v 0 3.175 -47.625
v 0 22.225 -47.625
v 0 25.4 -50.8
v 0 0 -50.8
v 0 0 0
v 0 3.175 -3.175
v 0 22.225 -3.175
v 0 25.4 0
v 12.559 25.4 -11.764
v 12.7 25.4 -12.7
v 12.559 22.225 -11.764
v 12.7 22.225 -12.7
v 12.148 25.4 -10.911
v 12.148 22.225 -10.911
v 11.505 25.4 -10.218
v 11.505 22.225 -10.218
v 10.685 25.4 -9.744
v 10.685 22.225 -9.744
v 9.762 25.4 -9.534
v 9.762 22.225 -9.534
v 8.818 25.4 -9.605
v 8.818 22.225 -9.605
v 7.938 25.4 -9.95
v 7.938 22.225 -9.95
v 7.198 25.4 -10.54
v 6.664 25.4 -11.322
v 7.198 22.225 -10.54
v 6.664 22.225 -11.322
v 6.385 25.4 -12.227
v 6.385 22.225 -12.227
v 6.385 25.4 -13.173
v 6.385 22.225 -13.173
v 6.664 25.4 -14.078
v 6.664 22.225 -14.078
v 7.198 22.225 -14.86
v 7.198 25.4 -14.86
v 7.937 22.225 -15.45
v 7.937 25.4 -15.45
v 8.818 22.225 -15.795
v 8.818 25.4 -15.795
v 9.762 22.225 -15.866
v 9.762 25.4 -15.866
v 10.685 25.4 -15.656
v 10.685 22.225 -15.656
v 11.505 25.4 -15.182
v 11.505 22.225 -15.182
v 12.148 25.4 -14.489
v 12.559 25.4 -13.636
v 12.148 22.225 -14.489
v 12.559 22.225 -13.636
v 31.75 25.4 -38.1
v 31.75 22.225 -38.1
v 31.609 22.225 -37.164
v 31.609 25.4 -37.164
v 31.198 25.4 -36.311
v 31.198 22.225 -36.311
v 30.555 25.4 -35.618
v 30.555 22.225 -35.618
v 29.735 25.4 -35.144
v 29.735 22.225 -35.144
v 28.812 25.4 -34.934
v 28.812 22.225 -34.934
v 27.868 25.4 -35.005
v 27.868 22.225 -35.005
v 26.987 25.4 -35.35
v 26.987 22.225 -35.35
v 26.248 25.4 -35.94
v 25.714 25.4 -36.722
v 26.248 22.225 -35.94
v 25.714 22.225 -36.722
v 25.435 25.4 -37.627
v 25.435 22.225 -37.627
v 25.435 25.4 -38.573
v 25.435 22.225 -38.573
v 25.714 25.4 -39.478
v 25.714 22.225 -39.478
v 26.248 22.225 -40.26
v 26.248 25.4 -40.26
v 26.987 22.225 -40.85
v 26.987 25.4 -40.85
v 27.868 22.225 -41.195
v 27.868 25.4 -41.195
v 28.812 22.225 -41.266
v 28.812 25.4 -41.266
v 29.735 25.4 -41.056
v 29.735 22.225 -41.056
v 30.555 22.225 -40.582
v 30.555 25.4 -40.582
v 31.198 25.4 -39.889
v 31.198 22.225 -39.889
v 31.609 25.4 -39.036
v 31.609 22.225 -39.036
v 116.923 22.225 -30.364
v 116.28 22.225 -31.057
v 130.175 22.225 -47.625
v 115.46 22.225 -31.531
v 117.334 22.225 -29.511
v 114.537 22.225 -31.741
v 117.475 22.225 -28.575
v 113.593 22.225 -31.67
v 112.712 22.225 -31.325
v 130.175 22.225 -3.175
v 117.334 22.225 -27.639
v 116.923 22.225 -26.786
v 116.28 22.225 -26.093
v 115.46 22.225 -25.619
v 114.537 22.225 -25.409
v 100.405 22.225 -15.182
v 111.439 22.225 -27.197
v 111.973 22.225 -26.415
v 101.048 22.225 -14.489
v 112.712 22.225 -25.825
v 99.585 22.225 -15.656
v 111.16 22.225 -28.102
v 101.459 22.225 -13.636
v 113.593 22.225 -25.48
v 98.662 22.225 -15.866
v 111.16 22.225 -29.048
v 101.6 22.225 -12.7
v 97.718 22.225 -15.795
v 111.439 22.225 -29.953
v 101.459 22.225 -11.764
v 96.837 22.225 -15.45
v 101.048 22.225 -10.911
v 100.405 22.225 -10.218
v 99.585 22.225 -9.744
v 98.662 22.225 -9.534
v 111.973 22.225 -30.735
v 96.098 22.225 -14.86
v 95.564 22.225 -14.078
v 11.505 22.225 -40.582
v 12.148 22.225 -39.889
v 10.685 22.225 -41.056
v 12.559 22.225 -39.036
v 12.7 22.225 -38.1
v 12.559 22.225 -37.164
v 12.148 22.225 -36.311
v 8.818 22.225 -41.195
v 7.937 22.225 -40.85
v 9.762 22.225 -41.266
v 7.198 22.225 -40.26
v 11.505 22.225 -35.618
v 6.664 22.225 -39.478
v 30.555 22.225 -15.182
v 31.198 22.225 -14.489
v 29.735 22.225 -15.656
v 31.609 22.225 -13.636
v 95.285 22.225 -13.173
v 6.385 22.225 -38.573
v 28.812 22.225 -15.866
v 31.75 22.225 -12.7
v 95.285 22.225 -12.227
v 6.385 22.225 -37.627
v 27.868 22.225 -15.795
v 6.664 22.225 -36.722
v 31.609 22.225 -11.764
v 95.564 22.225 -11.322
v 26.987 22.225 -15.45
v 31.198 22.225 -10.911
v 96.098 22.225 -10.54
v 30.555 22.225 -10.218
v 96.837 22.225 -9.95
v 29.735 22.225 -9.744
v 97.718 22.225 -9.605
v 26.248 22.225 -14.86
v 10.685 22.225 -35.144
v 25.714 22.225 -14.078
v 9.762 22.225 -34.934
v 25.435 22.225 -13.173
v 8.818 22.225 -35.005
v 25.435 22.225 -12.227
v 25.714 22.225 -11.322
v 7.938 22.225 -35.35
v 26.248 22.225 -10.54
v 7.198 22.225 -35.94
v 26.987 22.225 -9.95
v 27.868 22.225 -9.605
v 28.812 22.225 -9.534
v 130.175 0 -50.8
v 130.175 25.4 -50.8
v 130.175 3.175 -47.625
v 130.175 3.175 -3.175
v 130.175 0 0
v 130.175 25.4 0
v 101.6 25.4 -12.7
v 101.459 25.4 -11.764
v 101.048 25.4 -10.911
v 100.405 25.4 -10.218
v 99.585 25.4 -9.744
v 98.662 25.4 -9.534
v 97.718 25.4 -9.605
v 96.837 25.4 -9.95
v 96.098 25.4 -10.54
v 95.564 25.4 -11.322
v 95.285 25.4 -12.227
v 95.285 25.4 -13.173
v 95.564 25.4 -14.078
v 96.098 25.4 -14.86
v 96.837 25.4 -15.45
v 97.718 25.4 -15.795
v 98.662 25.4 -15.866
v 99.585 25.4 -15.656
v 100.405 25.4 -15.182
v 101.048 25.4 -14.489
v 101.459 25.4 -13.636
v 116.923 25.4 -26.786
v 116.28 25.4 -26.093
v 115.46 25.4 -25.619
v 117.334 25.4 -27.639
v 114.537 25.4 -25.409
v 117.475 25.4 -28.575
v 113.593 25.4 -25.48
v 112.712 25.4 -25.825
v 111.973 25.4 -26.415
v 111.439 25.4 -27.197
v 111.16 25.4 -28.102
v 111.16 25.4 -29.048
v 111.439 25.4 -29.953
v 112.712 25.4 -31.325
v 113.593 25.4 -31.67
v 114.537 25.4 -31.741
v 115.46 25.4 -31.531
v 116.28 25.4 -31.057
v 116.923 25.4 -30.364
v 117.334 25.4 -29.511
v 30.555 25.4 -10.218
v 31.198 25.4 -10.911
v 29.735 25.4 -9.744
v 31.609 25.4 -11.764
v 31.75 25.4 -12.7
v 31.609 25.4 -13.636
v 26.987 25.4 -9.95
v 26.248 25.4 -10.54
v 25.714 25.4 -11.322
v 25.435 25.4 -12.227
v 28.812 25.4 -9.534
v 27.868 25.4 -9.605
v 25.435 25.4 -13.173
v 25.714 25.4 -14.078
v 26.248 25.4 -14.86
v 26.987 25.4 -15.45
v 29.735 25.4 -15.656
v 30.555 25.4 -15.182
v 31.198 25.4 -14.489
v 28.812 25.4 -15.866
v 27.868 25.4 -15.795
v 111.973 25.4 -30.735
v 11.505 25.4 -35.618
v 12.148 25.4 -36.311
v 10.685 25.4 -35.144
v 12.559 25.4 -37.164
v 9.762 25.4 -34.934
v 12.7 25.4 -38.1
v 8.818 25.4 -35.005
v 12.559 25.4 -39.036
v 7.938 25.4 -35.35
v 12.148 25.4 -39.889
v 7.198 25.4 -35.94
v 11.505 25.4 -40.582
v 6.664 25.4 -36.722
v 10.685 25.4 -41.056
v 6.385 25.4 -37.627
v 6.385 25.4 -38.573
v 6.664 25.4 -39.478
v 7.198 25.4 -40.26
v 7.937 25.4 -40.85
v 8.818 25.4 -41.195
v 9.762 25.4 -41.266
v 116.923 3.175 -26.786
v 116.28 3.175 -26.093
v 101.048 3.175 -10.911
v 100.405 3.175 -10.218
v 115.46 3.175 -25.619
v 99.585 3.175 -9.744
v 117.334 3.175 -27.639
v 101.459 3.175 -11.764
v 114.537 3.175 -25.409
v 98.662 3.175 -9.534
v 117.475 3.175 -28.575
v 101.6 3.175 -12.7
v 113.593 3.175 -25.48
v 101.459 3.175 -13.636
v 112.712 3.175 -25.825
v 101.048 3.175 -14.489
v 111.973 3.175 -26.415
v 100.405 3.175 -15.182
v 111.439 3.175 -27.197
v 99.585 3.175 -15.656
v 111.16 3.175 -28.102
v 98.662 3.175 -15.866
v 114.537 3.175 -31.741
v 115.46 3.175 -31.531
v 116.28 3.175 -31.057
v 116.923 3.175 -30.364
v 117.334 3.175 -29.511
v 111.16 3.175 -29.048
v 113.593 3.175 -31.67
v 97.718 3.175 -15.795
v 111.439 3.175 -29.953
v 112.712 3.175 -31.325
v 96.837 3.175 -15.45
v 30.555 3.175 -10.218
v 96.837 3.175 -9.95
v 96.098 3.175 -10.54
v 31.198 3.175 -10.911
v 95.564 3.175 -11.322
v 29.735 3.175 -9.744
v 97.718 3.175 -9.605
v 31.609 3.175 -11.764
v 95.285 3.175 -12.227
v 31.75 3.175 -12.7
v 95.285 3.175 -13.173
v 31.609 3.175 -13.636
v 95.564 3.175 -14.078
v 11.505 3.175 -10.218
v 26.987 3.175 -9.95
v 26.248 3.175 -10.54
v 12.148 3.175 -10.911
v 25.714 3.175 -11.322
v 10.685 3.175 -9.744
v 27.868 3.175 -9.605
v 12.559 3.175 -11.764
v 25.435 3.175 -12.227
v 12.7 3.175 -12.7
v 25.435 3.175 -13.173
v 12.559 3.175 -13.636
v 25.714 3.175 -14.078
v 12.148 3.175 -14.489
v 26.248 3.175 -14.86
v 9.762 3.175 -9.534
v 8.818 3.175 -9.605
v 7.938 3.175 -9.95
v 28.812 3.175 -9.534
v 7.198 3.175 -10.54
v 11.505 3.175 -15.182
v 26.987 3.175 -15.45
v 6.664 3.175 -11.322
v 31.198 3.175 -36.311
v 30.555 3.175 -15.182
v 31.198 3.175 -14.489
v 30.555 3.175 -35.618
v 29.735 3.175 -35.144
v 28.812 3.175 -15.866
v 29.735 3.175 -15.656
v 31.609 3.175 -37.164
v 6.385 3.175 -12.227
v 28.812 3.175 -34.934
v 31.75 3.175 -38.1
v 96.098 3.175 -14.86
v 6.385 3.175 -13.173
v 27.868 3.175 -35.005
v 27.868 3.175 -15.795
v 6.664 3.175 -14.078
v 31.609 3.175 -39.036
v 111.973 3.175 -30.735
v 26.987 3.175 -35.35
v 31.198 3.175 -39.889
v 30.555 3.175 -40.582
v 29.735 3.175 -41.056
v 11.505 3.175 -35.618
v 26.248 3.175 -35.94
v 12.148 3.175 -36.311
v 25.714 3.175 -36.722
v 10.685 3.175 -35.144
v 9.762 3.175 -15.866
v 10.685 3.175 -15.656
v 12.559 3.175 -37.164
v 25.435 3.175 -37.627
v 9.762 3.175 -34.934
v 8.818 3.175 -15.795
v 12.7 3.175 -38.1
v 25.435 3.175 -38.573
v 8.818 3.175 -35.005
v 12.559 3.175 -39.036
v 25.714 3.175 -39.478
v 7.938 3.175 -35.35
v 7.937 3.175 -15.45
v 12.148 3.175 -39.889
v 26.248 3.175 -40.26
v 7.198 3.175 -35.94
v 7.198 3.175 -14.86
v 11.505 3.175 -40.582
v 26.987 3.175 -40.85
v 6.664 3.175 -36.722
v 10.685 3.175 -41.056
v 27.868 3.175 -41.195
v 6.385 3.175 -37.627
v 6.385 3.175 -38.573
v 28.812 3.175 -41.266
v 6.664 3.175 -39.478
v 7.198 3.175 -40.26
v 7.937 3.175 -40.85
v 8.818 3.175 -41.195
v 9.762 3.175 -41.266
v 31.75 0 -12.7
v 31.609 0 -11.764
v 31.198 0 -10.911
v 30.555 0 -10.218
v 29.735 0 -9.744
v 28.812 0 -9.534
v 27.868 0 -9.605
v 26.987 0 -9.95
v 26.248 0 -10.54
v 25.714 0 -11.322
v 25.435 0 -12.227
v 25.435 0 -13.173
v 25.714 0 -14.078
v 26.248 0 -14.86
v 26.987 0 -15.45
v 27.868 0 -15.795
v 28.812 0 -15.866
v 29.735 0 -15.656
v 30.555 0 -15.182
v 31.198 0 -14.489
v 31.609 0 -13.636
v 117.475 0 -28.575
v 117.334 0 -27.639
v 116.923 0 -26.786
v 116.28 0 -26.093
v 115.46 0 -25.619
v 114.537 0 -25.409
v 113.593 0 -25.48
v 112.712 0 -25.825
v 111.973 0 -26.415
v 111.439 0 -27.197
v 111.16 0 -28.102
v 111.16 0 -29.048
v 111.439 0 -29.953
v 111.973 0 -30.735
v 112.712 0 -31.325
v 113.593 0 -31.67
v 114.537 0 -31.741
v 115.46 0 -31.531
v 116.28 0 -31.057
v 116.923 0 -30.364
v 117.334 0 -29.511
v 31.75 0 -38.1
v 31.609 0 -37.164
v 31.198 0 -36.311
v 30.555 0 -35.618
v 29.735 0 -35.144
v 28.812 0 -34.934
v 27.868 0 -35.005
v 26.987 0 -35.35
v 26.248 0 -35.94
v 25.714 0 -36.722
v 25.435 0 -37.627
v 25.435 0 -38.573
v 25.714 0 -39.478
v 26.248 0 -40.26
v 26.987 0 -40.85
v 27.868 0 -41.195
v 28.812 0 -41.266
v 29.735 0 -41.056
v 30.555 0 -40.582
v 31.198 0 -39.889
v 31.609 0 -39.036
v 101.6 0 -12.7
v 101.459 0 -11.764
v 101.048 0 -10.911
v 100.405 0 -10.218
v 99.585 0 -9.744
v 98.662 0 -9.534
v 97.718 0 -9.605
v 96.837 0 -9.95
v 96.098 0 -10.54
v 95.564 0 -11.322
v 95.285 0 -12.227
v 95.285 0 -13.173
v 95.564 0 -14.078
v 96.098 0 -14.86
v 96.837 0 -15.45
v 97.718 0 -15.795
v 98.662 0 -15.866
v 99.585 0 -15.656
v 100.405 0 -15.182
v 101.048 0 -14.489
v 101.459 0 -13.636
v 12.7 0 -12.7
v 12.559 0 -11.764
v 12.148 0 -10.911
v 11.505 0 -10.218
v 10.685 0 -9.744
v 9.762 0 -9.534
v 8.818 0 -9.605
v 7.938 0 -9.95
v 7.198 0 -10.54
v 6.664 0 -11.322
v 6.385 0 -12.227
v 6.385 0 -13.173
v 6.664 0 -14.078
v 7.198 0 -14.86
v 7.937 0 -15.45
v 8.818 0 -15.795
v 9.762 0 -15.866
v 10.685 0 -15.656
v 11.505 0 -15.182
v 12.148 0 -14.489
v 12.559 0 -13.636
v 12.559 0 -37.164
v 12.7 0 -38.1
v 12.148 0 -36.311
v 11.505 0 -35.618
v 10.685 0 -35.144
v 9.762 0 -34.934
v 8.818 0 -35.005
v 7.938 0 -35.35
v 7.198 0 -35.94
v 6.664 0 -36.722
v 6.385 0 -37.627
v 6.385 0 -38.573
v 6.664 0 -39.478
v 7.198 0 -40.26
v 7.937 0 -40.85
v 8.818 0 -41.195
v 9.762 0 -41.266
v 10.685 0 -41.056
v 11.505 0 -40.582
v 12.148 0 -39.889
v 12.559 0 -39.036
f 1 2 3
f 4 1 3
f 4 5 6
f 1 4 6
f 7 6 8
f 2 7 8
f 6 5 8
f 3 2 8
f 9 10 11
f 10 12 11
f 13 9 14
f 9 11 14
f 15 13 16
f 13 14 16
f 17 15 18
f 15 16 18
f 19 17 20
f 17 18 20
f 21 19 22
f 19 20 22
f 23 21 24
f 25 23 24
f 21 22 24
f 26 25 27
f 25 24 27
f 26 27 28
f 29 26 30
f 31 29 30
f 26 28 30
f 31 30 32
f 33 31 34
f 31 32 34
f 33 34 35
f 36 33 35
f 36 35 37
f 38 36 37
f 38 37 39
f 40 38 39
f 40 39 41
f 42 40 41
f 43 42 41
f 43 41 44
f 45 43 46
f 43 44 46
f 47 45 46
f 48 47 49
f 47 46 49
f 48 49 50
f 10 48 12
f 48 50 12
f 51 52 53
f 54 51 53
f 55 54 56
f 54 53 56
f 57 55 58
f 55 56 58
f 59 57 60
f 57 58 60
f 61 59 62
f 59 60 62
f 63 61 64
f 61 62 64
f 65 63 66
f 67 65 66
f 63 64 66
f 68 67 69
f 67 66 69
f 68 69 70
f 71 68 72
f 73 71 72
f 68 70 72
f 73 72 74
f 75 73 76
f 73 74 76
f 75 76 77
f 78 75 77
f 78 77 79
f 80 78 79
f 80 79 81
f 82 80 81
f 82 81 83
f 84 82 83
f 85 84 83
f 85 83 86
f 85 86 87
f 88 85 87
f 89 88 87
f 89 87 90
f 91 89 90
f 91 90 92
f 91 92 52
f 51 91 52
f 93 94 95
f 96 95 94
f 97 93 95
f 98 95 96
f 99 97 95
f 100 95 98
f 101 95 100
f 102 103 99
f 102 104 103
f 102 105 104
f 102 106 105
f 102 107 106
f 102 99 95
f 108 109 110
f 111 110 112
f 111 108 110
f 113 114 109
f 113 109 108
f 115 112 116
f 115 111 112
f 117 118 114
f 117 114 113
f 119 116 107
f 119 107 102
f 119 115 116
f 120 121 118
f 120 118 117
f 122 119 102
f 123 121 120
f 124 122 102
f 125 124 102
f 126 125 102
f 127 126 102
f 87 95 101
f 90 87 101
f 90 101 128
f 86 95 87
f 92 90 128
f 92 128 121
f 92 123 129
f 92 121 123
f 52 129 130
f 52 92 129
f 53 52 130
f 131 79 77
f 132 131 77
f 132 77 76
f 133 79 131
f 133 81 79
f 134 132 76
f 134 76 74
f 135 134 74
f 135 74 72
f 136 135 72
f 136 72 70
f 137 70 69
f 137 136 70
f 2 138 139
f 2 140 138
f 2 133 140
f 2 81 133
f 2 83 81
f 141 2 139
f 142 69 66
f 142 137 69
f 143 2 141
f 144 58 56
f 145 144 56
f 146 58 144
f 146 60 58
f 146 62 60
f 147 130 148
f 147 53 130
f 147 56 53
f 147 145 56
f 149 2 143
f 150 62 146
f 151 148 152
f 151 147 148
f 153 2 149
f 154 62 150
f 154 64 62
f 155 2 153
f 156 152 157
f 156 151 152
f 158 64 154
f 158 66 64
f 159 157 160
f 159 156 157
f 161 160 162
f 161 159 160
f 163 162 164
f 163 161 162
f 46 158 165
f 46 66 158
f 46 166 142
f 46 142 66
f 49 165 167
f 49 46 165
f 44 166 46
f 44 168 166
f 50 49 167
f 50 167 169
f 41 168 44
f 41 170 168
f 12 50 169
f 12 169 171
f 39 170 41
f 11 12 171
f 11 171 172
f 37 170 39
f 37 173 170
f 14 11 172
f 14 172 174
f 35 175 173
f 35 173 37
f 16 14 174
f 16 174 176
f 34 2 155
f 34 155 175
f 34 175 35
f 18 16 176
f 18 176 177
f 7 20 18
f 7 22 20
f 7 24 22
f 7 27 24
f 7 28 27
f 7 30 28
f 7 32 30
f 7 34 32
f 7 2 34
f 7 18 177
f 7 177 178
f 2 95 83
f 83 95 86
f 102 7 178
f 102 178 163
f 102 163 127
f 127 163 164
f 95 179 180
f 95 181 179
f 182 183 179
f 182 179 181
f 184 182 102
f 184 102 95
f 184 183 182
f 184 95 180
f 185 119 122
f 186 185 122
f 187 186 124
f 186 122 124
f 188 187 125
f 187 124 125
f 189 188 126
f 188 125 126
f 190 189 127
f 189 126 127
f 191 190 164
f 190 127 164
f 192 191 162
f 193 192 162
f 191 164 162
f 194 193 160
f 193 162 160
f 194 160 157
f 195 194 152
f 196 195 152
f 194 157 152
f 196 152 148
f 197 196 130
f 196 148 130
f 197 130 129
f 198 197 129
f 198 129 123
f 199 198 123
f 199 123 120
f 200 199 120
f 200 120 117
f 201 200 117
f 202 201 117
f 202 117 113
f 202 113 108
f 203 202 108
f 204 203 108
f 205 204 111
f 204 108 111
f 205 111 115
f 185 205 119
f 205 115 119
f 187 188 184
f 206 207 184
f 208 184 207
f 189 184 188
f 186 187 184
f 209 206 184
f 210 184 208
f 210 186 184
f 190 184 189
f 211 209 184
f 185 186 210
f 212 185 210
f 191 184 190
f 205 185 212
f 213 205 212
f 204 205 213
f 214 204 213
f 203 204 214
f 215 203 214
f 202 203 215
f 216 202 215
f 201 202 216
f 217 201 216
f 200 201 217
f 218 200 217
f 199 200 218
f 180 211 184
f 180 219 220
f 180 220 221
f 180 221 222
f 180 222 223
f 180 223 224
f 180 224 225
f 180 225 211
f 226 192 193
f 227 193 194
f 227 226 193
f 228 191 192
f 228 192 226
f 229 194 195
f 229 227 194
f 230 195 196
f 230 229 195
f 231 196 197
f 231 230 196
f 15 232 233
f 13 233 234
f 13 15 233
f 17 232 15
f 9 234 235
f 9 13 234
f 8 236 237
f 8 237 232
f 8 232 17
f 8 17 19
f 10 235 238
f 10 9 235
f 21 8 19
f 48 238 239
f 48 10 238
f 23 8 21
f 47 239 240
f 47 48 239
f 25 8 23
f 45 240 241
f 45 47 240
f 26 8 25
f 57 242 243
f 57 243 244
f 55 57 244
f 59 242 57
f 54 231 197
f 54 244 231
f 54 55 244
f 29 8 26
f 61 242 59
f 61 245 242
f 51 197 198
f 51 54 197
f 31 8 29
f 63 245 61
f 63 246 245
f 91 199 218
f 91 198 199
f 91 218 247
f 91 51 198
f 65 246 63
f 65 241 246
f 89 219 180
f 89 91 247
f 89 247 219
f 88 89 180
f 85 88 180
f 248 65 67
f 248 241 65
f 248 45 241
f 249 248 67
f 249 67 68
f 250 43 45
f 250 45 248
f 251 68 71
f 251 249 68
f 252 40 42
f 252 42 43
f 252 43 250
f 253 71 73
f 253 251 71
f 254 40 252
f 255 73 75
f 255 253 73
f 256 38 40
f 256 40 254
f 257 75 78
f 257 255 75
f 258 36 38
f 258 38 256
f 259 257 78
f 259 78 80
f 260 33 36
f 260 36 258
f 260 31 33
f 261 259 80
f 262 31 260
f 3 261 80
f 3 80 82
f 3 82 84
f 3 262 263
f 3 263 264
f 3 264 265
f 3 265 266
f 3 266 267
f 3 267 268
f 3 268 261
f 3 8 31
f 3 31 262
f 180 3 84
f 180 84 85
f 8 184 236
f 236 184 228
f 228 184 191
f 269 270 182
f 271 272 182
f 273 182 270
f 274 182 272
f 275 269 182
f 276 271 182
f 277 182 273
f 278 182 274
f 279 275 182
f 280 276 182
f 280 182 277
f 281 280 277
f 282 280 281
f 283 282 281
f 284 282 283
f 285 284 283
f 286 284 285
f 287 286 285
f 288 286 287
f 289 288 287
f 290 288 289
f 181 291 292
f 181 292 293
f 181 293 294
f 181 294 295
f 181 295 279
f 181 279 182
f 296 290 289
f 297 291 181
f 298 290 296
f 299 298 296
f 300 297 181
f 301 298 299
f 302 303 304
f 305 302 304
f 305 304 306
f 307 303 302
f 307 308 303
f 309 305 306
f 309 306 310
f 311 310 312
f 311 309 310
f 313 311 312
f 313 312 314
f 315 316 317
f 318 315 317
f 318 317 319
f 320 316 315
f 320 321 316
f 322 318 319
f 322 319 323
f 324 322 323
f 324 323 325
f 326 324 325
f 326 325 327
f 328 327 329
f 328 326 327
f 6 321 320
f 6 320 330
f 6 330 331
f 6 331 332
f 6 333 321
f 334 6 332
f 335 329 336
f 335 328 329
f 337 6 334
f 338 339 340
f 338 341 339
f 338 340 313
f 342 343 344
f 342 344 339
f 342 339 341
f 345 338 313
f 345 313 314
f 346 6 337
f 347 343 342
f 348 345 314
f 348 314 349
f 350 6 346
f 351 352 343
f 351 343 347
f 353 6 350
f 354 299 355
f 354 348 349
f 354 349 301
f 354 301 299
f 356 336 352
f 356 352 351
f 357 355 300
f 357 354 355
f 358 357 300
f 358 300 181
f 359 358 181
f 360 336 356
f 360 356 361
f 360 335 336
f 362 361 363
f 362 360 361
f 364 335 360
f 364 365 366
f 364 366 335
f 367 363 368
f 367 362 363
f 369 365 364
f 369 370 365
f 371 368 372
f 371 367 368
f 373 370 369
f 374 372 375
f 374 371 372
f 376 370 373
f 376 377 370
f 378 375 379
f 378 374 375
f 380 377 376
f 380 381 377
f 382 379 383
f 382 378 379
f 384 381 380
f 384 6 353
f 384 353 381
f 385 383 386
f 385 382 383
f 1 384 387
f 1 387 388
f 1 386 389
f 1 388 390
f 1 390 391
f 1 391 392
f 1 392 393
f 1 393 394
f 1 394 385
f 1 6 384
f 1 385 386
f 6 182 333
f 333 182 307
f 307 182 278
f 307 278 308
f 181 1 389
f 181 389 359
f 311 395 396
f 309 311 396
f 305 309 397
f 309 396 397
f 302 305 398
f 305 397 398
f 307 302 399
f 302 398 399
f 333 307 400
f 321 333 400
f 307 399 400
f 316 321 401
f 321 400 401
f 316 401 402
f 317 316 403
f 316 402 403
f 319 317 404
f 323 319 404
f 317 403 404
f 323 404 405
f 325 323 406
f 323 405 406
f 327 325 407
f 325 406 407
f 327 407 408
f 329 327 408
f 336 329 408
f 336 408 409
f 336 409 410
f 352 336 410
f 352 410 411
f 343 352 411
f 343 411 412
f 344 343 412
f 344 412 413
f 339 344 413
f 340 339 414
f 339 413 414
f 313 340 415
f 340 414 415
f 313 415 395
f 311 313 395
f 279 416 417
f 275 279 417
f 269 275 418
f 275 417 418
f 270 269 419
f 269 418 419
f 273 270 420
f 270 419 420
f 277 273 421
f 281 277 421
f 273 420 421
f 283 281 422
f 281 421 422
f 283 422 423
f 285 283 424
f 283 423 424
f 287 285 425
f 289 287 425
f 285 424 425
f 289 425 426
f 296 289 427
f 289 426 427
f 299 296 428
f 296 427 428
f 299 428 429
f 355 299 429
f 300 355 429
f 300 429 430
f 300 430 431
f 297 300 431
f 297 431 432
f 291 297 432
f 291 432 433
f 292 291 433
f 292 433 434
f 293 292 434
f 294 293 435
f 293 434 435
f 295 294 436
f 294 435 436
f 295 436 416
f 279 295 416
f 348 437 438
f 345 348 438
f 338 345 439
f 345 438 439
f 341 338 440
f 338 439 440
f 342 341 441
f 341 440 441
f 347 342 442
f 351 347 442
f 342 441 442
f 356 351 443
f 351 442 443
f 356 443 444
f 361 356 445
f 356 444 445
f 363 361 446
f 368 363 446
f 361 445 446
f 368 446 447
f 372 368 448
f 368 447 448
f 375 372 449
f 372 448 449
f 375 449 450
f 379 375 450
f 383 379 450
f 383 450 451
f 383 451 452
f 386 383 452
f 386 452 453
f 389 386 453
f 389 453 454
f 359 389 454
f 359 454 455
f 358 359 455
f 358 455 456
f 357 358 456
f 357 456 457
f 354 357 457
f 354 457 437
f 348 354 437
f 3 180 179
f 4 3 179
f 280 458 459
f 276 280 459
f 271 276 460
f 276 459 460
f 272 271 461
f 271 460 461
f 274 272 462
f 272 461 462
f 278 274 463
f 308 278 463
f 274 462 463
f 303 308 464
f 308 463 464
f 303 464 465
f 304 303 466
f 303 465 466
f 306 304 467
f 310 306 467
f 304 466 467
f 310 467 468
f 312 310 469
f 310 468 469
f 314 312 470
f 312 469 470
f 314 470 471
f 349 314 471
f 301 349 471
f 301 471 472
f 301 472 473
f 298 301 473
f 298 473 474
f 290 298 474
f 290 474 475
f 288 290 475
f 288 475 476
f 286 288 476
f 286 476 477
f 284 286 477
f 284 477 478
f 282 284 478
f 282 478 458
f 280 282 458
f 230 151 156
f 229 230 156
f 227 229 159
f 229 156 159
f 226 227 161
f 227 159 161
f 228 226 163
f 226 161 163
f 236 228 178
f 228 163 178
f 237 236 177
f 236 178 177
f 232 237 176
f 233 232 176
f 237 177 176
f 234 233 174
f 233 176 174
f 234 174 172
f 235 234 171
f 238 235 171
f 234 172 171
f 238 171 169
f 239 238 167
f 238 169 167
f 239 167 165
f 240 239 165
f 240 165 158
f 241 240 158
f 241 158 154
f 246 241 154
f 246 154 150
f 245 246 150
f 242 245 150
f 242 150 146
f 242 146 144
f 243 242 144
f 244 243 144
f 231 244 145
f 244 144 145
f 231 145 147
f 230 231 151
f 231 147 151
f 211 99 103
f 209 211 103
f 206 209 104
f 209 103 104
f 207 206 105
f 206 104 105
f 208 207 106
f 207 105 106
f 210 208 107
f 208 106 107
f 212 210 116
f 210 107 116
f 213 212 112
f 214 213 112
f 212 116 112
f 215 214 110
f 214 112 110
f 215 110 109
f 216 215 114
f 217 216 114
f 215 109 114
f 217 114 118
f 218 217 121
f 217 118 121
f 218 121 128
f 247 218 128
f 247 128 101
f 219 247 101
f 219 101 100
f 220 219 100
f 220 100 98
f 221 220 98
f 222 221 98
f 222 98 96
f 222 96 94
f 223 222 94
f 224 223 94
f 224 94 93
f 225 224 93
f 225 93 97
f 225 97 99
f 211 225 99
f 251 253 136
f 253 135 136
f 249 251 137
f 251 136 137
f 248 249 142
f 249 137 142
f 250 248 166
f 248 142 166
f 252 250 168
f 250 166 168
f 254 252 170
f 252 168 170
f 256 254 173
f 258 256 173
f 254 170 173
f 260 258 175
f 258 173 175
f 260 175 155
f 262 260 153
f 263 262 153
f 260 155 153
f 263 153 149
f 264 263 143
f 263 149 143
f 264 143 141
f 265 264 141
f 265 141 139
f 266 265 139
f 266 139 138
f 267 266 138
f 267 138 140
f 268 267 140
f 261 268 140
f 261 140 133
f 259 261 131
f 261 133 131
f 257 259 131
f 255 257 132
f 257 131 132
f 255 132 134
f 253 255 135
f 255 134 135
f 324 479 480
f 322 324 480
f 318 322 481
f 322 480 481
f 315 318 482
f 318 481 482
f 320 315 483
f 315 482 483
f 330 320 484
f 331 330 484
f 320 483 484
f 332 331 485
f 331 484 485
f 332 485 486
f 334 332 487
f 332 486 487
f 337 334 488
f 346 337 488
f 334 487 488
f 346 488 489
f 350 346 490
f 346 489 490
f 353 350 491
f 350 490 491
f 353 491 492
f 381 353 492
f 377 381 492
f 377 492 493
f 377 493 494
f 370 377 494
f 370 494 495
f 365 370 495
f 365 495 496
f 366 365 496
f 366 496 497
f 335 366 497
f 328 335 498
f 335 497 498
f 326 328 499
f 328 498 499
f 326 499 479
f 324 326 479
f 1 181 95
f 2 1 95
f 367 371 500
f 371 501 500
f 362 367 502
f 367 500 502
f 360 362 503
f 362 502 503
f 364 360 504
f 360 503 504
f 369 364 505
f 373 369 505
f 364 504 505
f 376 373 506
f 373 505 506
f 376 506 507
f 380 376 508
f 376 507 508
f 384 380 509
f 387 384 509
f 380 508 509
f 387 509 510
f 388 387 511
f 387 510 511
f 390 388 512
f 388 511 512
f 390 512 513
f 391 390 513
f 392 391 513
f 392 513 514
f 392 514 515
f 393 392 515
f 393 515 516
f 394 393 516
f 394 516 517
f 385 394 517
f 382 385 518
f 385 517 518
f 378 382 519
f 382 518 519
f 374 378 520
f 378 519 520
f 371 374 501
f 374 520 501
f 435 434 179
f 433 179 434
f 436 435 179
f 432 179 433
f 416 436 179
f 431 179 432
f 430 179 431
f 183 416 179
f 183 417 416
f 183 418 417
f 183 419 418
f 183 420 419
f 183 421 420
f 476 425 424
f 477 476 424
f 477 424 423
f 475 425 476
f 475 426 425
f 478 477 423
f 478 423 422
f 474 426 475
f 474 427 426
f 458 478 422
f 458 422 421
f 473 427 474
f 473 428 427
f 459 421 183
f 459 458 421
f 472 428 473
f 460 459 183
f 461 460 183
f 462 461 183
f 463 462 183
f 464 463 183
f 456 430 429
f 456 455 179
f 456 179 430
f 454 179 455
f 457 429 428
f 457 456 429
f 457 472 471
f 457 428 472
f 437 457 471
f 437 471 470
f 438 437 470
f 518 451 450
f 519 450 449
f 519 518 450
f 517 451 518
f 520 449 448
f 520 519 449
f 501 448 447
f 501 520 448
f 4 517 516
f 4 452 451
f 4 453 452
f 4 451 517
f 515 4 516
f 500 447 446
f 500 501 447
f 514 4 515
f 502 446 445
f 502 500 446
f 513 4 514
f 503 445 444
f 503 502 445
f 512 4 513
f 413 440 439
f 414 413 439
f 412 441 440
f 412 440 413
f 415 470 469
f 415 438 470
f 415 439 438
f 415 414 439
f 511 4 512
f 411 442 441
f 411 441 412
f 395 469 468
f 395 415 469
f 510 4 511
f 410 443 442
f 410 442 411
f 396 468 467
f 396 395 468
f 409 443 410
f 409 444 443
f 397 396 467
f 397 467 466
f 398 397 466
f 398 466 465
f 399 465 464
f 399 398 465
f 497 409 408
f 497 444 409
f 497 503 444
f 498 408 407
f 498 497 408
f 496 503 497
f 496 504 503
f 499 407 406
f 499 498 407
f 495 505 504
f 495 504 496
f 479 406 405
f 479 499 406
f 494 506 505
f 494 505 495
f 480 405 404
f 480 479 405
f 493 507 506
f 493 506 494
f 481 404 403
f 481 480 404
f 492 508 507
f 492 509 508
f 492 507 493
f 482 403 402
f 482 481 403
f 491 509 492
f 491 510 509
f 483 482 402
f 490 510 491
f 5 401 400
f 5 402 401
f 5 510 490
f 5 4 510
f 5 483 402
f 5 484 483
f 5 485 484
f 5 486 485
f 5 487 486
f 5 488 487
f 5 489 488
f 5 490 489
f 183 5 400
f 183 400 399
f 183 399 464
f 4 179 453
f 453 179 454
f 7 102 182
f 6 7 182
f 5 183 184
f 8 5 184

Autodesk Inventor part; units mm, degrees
ref_plane "YZ Plane" through (0, 0, 0) normal (1, 0, 0) x (0, 1, 0)
ref_plane "XZ Plane" through (0, 0, 0) normal (0, 1, 0) x (-1, 0, 0)
ref_plane "XY Plane" through (0, 0, 0) normal (0, 0, 1) x (1, 0, 0)
sketch "Sketch1" plane through (0, 0, 0) normal (1, 0, 0) x (0, 1, 0)
  line L0 (0, 0) -> (25.4, 0)
  line L1 (25.4, 0) -> (25.4, -50.8)
  line L2 (25.4, -50.8) -> (0, -50.8)
  line L3 (0, -50.8) -> (0, 0)
  line L4 (22.225, -47.625) -> (22.225, -3.175)
  line L5 (22.225, -3.175) -> (3.175, -3.175)
  line L6 (3.175, -3.175) -> (3.175, -47.625)
  line L7 (3.175, -47.625) -> (22.225, -47.625)
  dimension "d0" = 25.4
  dimension "d1" = 50.8
  dimension "d2" = 3.175
extrude "Extrusion1" add sketch "Sketch1" along normal blind 130.175
sketch "Sketch2" plane through (0, 0, -50.8) normal (0, -1, 0) x (1, 0, 0)
  circle A0 centre (114.3, 22.225) radius 3.175
  circle A1 centre (98.425, 38.1) radius 3.175
  line L0 (130.175, 50.8) -> (130.175, 0) projected
  line L1 (0, 50.8) -> (130.175, 50.8) projected
  circle A2 centre (9.525, 12.7) radius 3.175
  circle A3 centre (9.525, 38.1) radius 3.175
  circle A4 centre (28.575, 12.7) radius 3.175
  circle A5 centre (28.575, 38.1) radius 3.175
  line L2 (0, 0) -> (0, 50.8) projected
  line L3 (0, 0) -> (130.175, 0) projected
  dimension "d5" = 6.35
  dimension "d6" = 6.35
  dimension "d7" = 31.75
  dimension "d8" = 15.875
  dimension "d9" = 28.575
  dimension "d10" = 12.7
  dimension "d13" = 6.35
  dimension "d14" = 6.35
  dimension "d15" = 6.35
  dimension "d16" = 6.35
  dimension "d17" = 12.7
  dimension "d18" = 12.7
  dimension "d19" = 9.525
  dimension "d20" = 9.525
  dimension "d21" = 12.7
  dimension "d22" = 12.7
  dimension "d23" = 25.4
  dimension "d24" = 28.575
extrude "Extrusion2" cut sketch "Sketch2" against normal blind 25.4 contours A0 | A1 | A2 | A3 | A4 | A5
properties part number "15102898-16-P-0801" material "Aluminum 6061"
